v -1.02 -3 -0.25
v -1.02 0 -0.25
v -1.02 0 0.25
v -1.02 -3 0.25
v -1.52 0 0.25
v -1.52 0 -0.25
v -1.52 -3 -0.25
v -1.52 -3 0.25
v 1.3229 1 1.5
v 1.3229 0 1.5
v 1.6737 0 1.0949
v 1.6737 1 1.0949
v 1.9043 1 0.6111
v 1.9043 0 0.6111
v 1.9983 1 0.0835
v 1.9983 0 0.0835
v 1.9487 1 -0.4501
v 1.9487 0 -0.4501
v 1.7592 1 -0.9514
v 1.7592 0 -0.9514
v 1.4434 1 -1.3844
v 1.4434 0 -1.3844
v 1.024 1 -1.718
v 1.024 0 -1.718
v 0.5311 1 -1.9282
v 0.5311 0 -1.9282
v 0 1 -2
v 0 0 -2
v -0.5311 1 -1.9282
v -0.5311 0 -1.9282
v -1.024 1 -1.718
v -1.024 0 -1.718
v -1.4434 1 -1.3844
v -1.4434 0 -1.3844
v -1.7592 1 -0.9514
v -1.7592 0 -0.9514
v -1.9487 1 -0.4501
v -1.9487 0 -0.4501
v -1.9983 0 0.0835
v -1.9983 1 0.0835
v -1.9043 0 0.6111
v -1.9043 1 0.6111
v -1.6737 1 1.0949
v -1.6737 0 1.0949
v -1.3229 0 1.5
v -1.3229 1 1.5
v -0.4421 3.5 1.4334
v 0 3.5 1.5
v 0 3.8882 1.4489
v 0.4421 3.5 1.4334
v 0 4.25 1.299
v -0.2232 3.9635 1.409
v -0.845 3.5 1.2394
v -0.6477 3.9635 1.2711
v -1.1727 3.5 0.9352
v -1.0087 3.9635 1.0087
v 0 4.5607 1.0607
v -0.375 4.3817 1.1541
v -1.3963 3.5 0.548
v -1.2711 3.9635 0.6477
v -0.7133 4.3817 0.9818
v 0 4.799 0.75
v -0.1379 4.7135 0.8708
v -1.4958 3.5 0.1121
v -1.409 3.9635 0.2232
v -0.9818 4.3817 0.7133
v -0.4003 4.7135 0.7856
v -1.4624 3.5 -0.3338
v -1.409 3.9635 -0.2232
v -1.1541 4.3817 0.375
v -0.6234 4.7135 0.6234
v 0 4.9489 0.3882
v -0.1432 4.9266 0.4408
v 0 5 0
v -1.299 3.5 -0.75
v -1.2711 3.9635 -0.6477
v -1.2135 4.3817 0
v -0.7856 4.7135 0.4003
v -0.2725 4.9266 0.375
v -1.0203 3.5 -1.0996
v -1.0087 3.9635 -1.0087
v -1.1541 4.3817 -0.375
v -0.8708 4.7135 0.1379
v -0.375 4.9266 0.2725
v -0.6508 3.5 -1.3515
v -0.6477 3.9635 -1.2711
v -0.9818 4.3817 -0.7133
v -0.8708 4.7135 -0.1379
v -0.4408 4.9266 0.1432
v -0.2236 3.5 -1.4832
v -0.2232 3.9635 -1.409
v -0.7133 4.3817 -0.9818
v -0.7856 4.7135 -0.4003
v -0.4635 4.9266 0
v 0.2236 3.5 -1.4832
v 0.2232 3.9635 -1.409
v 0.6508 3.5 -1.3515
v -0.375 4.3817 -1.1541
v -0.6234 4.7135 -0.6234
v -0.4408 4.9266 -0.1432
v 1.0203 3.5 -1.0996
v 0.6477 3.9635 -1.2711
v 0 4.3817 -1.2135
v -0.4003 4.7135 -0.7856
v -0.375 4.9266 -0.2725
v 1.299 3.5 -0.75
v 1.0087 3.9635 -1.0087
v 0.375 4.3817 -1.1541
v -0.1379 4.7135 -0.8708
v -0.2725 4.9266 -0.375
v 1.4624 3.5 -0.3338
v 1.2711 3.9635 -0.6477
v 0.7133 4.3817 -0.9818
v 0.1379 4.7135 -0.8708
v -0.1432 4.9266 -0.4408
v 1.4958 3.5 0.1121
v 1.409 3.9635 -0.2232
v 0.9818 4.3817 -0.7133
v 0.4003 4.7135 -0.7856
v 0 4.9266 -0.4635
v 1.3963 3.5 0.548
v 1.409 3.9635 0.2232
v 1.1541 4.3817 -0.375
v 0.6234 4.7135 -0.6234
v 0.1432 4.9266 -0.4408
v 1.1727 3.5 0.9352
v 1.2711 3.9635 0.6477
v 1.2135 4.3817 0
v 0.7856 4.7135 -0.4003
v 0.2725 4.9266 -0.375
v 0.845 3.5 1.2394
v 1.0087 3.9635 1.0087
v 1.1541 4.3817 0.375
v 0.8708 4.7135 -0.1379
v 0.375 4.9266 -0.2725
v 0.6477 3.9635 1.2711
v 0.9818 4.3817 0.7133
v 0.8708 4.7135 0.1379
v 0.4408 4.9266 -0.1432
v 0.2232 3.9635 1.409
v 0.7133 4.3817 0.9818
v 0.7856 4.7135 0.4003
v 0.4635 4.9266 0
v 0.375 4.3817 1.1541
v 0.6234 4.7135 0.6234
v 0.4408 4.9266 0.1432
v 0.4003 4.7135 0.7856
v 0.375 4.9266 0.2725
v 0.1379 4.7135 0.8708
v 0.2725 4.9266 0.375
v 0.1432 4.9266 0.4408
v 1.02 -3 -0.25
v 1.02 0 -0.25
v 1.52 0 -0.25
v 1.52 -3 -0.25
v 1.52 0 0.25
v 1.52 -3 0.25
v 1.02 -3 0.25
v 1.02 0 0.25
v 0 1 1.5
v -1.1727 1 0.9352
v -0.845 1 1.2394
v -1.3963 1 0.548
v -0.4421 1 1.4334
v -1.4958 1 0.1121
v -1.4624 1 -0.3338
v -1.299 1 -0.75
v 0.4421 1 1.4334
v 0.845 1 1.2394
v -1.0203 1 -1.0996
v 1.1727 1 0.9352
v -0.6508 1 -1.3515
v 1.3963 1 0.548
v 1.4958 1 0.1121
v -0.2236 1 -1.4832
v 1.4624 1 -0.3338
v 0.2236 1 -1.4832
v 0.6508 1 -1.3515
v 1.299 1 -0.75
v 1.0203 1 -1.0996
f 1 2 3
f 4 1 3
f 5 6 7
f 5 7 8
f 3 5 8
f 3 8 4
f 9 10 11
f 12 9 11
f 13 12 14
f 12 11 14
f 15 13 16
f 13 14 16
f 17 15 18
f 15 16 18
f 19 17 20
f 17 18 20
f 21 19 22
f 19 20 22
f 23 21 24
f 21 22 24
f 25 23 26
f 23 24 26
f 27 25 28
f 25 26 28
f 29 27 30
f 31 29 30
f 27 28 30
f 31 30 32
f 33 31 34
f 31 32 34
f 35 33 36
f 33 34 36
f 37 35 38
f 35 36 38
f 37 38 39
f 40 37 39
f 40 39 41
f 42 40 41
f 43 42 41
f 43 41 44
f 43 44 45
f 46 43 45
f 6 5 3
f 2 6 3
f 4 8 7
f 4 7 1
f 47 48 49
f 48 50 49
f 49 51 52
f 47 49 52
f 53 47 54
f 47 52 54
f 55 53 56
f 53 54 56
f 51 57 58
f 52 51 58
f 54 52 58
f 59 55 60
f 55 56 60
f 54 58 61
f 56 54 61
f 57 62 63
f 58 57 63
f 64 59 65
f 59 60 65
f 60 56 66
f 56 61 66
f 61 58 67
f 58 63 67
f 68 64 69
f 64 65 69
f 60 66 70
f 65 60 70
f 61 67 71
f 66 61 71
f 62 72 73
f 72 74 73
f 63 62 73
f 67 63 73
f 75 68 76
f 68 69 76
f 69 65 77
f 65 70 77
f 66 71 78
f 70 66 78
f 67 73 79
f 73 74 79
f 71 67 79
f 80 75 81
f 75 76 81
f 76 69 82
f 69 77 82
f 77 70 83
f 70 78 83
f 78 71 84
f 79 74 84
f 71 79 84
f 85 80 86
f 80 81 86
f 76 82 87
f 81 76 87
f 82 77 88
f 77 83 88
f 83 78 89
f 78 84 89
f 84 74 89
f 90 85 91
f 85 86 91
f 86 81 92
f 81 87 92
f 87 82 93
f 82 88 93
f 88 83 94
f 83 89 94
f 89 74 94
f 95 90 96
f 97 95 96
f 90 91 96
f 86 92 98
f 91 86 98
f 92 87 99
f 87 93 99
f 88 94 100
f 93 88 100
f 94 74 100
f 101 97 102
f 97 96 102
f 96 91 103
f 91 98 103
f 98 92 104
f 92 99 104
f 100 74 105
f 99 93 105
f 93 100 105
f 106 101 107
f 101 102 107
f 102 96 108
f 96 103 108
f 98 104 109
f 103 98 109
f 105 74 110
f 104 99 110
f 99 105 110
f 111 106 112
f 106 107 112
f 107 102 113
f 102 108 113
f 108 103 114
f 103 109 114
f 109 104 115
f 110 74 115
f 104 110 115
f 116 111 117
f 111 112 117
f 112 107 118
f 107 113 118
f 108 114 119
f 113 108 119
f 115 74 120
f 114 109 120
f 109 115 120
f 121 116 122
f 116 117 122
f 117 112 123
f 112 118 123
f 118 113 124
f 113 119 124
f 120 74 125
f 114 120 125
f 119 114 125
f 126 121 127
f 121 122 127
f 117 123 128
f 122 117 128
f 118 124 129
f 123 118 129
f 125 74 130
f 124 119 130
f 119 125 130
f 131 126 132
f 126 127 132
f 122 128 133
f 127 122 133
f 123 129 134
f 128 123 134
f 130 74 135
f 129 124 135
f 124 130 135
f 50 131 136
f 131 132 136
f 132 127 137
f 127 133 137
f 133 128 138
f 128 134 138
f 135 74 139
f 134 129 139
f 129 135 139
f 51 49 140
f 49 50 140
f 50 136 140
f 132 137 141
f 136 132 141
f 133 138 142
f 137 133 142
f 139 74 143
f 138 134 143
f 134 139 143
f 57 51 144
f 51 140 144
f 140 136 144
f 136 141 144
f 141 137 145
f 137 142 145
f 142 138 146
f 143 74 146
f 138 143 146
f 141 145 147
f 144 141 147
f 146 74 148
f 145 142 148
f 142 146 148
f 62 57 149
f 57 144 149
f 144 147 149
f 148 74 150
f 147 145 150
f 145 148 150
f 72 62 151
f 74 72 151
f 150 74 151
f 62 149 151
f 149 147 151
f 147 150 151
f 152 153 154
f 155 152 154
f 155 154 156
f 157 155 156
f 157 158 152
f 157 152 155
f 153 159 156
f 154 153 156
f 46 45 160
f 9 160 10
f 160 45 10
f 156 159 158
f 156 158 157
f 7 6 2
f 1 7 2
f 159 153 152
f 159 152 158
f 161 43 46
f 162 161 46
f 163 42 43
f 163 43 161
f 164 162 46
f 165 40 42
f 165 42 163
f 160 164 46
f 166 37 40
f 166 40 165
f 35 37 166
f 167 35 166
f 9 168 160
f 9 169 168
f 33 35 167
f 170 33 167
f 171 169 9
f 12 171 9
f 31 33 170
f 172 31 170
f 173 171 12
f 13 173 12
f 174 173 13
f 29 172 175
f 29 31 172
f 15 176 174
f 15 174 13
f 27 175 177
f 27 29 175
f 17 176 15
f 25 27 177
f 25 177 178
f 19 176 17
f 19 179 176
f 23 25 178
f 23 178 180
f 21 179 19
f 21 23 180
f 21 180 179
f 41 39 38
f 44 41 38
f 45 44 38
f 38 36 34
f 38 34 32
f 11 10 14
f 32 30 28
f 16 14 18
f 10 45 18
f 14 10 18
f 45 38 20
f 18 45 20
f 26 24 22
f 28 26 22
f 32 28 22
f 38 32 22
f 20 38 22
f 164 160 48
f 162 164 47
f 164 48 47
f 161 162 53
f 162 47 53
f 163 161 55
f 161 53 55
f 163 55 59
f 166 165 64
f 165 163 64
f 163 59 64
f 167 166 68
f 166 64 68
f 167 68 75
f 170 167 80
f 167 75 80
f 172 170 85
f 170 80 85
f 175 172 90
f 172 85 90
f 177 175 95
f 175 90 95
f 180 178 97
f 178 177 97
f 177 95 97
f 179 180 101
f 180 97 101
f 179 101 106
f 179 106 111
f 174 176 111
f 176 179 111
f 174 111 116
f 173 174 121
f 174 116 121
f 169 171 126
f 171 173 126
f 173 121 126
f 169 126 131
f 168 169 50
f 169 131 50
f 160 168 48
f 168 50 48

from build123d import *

# Parameters (mm, degrees)
BOSS_EXTRUDE1_DEPTH   = 1
SKETCH3_W             = 0.5
SKETCH3_H             = 0.5
BOSS_EXTRUDE2_DEPTH   = 3
BOSS_EXTRUDE2_2_DEPTH = 3


with BuildPart() as part:
    # Sketch1 → Revolve1 (revolve)
    with BuildSketch(Plane(origin=(0, 0, 0), x_dir=(0, 0, -1), z_dir=(1, 0, 0))):
        with BuildLine():
            Line((-1.5, 0), (-1.5, 3.5))
            ThreePointArc((-1.5, 3.5), (-1.060660172, 4.560660172), (0, 5))
            Line((0, 5), (0, 0))
            Line((0, 0), (-1.5, 0))
        make_face()
    revolve(axis=Axis((0, 5, 0), (0, -1, 0)))

    # Sketch2 → Boss-Extrude1 (add)
    with BuildSketch(Plane(origin=(0, 0, 0), x_dir=(1, 0, 0), z_dir=(0, 1, 0))):
        with BuildLine():
            Line((-1.322875656, -1.5), (1.322875656, -1.5))
            ThreePointArc((1.322875656, -1.5), (0, 2), (-1.322875656, -1.5))
        make_face()
    extrude(amount=BOSS_EXTRUDE1_DEPTH)


with BuildPart() as body_2:
    # Sketch3 → Boss-Extrude2 (new body)
    with BuildSketch(Plane.XZ):
        with Locations((-1.27, 0)):
            Rectangle(SKETCH3_W, SKETCH3_H)
    extrude(amount=BOSS_EXTRUDE2_DEPTH)


with BuildPart() as body_3:
    # Sketch3 → Boss-Extrude2 2 (new body)
    with BuildSketch(Plane.XZ):
        with Locations((1.27, 0)):
            Rectangle(SKETCH3_W, SKETCH3_H)
    extrude(amount=BOSS_EXTRUDE2_2_DEPTH)


solid = Compound([part.part, body_2.part, body_3.part])
